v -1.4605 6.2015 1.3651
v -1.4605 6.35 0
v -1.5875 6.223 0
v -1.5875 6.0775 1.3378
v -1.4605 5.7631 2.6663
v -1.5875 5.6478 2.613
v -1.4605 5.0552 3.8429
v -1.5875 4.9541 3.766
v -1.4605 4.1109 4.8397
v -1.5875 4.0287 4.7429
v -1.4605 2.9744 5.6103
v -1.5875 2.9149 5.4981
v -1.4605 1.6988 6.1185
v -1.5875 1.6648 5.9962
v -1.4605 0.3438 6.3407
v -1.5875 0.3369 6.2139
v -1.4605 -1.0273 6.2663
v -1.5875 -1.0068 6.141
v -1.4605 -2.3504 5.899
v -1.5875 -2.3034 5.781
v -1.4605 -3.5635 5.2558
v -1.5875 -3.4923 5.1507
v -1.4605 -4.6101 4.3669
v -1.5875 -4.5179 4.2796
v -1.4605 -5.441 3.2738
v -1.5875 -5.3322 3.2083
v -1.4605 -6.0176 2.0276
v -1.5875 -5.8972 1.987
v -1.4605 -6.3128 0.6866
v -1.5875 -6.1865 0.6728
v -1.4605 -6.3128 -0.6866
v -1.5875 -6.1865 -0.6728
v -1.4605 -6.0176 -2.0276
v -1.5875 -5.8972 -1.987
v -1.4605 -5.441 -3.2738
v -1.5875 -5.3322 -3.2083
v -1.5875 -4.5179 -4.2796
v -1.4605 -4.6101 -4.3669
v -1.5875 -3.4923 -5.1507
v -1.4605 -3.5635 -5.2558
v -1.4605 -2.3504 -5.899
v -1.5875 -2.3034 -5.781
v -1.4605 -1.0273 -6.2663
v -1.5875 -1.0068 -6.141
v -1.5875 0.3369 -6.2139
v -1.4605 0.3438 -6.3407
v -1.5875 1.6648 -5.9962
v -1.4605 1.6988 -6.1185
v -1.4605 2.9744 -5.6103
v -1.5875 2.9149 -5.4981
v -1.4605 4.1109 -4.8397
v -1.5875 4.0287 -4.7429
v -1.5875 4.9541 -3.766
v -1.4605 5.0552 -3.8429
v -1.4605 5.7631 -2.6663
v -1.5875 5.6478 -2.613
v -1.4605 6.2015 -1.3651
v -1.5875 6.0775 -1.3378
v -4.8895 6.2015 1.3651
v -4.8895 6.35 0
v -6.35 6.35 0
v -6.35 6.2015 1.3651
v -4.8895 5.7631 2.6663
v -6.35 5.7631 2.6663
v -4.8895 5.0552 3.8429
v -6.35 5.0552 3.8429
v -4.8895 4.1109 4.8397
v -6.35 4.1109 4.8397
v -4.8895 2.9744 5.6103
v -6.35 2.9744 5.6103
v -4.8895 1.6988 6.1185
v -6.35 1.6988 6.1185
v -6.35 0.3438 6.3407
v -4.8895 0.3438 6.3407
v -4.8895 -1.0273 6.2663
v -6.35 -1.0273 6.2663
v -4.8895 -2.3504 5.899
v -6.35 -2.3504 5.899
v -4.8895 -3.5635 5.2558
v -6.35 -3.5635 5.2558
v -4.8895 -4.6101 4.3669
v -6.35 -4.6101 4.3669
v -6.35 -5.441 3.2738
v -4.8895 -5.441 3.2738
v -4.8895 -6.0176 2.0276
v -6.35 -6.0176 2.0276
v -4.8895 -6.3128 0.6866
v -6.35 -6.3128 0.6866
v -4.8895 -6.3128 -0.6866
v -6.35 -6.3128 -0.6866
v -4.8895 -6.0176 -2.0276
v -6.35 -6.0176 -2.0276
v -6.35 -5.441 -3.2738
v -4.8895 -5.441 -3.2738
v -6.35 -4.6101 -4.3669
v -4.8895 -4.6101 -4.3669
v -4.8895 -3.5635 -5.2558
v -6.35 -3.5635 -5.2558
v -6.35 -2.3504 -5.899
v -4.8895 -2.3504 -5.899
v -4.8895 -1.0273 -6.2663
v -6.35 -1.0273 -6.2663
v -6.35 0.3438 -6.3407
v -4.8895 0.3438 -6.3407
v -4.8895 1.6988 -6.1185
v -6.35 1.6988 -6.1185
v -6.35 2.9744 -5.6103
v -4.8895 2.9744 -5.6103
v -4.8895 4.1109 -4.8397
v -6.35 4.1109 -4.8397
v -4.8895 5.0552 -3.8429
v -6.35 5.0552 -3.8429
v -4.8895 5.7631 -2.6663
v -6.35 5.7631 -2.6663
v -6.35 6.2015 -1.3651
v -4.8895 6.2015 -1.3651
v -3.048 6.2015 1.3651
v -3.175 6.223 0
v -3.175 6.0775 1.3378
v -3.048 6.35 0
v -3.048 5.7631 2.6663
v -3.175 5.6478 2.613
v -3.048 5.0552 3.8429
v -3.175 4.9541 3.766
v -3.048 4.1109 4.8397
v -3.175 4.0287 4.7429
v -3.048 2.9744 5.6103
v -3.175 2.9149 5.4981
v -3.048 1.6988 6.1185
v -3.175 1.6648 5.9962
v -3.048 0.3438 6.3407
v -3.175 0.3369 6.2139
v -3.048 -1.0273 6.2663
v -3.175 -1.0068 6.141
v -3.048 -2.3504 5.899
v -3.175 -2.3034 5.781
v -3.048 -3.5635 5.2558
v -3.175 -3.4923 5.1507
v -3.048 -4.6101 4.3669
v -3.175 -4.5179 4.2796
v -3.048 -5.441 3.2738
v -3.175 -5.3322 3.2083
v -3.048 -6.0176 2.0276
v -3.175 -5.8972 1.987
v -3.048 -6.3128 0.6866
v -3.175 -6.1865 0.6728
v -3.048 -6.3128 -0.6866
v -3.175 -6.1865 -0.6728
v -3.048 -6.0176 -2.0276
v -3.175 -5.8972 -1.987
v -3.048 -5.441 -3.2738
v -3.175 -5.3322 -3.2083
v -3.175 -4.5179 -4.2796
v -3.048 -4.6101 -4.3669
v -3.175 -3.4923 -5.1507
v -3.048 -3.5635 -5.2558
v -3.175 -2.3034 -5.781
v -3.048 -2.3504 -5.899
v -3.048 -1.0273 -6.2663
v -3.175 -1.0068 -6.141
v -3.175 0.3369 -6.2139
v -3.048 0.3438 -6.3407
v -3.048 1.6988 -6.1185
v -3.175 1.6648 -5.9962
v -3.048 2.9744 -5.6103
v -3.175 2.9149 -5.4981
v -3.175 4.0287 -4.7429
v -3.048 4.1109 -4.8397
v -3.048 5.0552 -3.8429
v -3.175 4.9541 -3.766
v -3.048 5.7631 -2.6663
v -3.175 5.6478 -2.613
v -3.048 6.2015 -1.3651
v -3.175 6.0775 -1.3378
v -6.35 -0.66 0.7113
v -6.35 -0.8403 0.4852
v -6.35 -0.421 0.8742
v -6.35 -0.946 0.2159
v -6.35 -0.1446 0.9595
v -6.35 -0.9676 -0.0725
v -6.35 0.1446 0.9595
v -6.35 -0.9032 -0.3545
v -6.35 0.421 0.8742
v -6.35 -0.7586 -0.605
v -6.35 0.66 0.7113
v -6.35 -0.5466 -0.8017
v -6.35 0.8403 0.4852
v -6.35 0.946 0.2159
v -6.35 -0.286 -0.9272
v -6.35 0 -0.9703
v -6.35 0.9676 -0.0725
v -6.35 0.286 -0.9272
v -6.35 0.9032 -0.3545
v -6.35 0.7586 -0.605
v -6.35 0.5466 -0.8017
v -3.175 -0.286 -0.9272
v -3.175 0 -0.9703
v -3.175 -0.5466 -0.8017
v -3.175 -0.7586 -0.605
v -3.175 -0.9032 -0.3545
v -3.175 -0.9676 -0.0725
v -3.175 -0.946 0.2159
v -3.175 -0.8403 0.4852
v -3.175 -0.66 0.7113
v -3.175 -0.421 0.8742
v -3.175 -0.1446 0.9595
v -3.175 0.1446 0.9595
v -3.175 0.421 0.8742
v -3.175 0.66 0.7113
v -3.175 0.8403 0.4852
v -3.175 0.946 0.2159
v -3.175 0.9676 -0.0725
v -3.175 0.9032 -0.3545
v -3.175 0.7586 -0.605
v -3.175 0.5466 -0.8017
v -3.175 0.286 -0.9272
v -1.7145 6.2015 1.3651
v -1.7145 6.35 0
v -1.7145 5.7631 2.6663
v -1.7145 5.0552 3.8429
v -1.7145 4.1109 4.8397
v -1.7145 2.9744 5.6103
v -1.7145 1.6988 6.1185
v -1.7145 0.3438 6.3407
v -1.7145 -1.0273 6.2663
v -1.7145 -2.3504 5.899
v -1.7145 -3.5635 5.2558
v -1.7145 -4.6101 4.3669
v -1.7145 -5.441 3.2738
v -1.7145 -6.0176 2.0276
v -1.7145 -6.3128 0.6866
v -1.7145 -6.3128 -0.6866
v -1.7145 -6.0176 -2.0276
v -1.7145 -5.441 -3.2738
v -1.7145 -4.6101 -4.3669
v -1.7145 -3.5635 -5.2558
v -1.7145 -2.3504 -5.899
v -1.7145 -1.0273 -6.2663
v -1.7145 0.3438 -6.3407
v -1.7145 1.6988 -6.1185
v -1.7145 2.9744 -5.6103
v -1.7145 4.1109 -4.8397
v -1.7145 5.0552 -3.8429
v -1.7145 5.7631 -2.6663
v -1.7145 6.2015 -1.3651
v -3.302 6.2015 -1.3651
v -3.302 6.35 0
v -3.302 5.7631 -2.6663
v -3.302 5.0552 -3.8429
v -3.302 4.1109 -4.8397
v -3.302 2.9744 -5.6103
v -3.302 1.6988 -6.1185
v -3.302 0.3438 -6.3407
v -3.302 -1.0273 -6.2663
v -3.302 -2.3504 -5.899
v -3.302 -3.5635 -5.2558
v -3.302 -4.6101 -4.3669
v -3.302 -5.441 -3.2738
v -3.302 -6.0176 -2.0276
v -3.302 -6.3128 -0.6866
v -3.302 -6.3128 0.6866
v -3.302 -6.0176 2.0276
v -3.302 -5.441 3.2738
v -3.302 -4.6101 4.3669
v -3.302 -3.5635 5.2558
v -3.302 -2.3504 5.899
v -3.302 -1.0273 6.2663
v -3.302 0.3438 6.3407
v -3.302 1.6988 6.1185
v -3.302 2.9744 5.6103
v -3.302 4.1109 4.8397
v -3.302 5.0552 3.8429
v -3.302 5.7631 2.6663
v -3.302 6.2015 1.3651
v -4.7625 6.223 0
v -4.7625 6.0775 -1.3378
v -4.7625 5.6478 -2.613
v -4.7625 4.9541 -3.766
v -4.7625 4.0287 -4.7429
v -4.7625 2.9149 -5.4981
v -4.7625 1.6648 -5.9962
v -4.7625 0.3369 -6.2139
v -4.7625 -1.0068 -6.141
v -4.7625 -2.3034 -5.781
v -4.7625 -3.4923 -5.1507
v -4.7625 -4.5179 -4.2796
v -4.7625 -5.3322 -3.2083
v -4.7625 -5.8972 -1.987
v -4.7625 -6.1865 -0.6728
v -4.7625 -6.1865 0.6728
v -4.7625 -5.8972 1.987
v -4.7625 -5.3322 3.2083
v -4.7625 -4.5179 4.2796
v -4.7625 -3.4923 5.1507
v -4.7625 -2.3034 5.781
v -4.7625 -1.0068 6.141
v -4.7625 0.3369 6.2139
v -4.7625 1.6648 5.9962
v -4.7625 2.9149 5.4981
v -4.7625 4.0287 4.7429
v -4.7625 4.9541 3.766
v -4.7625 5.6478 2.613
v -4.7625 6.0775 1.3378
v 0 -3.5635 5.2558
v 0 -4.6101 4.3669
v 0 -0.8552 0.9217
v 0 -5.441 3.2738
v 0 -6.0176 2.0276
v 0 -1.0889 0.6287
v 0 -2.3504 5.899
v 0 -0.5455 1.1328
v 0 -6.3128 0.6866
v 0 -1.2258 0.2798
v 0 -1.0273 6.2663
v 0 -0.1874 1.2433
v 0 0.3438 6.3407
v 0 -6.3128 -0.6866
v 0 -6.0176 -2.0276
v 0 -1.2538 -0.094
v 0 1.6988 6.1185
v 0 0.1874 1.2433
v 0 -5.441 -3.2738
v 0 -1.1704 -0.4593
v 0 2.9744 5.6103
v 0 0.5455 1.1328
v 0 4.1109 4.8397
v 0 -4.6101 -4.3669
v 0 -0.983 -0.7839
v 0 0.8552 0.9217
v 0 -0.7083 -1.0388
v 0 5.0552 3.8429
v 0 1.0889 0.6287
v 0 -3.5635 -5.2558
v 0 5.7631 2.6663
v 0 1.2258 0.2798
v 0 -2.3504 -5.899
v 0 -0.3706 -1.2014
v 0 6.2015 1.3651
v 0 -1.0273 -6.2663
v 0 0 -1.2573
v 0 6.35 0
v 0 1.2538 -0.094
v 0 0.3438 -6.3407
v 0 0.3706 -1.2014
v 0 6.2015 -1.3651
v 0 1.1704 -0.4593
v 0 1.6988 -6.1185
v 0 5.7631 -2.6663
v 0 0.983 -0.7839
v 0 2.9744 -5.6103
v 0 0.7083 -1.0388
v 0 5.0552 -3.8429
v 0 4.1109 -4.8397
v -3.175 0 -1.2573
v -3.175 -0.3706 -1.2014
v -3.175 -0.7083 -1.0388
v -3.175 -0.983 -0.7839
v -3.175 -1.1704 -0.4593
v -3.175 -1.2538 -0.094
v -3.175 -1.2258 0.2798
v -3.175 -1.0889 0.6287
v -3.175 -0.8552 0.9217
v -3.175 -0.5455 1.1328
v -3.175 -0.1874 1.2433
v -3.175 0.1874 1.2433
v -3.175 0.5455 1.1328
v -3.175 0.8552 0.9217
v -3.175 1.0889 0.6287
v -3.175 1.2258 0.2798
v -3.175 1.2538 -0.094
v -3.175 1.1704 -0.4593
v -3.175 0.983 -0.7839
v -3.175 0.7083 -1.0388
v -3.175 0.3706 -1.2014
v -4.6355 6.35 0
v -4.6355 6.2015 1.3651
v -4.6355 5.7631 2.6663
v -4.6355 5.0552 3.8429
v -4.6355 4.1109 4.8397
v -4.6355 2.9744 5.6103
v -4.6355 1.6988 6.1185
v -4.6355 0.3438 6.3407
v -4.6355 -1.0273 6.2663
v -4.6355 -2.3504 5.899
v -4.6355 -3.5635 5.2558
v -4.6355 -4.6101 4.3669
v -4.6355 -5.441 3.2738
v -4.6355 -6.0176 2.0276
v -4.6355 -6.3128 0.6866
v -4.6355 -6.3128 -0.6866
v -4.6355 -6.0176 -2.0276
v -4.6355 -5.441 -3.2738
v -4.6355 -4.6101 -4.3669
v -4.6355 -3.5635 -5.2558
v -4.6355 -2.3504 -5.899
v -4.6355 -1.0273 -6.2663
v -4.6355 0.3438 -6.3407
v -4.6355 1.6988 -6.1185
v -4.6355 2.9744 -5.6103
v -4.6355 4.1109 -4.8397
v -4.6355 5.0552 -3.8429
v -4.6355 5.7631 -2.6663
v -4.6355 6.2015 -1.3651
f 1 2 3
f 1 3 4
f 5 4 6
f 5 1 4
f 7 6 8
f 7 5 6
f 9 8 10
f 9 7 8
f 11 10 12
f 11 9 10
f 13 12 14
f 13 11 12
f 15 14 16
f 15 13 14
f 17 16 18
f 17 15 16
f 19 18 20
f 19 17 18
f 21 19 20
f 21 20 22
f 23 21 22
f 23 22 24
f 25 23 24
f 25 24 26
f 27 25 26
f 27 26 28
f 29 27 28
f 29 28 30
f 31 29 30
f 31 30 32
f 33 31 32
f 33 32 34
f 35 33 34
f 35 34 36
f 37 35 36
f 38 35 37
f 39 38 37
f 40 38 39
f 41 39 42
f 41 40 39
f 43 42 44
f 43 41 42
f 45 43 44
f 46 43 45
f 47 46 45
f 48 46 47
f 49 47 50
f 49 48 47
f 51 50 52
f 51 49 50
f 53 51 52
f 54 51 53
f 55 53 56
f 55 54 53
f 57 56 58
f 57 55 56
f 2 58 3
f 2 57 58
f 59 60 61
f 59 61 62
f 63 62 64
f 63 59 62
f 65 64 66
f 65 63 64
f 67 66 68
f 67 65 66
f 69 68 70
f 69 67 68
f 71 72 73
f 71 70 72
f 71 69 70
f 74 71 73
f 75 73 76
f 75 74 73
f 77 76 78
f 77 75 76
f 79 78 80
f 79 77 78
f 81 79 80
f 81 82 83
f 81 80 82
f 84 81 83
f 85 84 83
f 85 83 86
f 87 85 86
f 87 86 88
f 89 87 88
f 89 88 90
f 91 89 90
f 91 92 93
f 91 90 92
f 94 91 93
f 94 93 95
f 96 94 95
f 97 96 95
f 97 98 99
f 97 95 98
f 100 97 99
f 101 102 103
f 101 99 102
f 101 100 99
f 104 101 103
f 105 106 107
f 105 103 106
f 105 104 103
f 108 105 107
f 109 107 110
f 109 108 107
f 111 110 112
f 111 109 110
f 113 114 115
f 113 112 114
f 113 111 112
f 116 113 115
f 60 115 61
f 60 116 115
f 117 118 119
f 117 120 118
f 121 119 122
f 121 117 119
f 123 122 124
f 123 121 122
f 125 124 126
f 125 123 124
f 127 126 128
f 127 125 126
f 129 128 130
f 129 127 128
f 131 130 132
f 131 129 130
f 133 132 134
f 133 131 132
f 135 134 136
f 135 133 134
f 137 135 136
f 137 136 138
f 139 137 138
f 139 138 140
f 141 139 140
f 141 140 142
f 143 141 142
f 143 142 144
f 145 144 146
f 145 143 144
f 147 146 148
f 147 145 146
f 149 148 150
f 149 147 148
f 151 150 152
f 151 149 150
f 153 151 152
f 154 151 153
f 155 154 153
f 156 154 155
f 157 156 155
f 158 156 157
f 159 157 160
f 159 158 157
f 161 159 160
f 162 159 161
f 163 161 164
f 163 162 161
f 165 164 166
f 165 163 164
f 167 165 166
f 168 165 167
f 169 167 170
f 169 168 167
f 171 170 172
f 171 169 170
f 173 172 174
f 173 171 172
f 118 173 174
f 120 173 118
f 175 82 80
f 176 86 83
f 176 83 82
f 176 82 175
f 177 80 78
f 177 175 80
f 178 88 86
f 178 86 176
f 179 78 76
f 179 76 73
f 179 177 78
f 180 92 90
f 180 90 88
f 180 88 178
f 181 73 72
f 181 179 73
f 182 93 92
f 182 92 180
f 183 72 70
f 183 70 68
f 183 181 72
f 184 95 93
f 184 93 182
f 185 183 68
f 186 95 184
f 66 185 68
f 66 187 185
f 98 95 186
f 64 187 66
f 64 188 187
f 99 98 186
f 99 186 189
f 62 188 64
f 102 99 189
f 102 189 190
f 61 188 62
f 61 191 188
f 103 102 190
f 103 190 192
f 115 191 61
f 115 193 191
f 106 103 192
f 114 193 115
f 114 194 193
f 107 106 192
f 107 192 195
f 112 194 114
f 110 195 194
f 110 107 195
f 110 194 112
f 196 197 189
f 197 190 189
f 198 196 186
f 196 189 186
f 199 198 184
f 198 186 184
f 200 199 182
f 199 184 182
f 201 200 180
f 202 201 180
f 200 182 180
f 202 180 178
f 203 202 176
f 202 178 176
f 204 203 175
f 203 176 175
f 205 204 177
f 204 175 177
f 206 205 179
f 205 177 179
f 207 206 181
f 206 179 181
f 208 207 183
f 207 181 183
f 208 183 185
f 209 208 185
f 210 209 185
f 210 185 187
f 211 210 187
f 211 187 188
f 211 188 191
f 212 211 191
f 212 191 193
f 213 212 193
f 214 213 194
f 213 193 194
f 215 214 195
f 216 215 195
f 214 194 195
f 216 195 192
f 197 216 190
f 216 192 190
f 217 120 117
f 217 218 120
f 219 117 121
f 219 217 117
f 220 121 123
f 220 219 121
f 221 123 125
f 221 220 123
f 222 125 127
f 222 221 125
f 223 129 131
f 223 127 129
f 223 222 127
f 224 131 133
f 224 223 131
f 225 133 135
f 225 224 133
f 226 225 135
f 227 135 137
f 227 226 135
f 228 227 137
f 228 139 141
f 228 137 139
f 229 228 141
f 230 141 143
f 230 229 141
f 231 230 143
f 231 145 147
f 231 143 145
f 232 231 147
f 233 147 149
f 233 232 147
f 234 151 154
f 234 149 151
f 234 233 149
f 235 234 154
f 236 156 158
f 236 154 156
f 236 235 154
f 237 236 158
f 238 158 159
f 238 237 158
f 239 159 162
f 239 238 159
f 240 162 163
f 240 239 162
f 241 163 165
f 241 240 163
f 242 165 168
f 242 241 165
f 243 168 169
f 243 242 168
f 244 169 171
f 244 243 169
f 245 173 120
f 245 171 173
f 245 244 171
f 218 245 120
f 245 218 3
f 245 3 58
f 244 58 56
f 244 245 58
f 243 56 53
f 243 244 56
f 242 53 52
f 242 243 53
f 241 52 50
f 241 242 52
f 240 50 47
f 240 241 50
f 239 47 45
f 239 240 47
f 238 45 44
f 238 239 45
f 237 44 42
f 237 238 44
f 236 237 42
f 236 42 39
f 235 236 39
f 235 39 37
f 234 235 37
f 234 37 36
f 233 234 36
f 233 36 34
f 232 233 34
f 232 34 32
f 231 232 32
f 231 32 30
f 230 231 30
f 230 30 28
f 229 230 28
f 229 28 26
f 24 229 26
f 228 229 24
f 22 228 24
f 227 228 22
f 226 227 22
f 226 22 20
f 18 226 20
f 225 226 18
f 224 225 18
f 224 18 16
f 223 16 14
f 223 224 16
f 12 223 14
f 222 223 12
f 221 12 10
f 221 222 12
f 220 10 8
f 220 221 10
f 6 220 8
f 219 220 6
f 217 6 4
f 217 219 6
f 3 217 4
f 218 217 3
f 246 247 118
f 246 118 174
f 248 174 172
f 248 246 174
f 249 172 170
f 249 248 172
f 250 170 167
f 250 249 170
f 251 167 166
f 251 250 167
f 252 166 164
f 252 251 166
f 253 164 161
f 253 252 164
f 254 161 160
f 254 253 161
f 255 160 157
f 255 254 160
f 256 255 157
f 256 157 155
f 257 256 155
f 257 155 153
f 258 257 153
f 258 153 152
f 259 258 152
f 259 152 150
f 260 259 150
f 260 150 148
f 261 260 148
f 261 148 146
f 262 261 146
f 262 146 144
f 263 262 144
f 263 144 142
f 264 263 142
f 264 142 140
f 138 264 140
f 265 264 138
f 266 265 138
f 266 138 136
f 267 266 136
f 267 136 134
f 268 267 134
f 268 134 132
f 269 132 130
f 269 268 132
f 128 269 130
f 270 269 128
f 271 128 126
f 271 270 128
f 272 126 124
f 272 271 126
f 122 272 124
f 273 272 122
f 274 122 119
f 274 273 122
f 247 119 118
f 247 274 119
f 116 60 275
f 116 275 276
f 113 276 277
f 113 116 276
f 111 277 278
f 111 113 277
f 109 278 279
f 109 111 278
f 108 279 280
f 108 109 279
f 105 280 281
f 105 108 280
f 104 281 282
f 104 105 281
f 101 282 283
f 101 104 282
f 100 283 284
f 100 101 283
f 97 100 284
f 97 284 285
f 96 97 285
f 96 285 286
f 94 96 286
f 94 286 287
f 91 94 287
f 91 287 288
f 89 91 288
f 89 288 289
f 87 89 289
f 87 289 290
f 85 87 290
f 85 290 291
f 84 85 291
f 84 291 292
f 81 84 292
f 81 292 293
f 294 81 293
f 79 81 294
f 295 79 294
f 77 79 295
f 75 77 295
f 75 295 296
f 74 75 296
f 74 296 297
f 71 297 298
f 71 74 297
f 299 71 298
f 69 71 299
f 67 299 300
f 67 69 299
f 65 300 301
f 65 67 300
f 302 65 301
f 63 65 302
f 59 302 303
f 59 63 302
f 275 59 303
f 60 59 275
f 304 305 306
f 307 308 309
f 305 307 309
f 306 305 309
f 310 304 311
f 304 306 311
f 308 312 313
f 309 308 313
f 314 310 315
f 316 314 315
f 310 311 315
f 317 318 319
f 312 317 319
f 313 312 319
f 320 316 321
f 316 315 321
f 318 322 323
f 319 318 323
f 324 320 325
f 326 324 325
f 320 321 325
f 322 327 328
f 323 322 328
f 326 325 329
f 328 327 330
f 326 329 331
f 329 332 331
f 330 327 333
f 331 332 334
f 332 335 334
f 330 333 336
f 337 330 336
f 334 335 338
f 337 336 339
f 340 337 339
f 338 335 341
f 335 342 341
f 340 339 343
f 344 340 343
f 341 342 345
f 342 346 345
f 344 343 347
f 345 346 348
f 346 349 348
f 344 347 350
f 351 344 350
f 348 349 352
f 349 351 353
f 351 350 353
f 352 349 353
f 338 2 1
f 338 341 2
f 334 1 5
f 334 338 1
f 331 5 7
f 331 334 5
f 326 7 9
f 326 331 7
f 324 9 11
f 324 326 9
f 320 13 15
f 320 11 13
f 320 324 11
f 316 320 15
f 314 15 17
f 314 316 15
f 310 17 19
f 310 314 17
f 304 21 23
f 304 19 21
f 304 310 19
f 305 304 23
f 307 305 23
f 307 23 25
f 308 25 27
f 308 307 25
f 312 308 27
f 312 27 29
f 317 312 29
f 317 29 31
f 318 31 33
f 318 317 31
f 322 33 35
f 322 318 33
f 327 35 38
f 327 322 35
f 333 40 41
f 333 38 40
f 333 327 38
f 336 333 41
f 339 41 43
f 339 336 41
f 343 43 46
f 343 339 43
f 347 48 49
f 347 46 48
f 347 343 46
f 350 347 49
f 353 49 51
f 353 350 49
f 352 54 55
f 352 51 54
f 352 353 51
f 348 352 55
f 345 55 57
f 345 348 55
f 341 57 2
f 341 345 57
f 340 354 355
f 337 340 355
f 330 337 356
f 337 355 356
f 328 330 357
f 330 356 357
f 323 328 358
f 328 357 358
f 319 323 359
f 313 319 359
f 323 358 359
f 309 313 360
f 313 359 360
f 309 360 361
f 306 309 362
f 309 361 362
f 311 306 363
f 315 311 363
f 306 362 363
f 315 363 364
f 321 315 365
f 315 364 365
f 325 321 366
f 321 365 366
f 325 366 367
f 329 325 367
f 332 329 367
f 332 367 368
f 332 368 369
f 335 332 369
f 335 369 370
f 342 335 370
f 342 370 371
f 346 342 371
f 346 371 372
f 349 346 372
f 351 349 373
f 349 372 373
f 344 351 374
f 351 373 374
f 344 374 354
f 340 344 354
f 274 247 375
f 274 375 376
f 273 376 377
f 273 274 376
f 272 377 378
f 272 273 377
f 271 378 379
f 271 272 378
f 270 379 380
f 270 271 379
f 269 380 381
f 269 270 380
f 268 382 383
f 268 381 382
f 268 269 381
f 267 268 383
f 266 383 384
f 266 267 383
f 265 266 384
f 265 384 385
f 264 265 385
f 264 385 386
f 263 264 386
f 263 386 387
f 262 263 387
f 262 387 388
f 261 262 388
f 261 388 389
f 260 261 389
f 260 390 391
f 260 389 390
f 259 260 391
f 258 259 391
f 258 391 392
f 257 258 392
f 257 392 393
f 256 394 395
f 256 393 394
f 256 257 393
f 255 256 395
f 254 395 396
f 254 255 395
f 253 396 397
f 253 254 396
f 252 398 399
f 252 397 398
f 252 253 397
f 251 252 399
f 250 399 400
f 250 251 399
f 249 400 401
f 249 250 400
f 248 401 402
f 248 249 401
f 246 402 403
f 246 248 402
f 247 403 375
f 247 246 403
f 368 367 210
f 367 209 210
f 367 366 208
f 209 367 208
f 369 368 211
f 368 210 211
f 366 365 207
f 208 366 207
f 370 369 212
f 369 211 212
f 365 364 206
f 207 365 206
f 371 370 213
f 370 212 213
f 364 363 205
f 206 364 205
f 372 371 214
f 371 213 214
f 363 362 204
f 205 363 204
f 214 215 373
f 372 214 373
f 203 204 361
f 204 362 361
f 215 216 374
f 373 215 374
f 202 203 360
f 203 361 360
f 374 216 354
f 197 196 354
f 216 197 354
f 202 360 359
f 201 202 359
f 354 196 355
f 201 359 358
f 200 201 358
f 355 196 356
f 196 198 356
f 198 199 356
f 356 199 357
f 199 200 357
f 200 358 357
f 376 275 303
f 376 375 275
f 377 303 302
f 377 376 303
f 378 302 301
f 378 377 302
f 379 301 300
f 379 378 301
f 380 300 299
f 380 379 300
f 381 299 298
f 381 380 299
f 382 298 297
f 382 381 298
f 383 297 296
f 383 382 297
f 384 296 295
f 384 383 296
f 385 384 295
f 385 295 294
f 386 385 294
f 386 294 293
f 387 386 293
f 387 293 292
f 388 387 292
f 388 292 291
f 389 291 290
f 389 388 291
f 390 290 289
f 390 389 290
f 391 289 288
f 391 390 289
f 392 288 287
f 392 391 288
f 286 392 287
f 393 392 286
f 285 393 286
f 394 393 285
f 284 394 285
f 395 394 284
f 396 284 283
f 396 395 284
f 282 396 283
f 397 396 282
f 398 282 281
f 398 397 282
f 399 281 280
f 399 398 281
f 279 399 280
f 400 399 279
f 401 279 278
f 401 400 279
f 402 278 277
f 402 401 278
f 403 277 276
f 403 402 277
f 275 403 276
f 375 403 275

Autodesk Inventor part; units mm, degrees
ref_plane "YZ Plane" through (0, 0, 0) normal (1, 0, 0) x (0, 1, 0)
ref_plane "XZ Plane" through (0, 0, 0) normal (0, 1, 0) x (-1, 0, 0)
ref_plane "XY Plane" through (0, 0, 0) normal (0, 0, 1) x (1, 0, 0)
sketch "Boceto1" plane through (0, 0, 0) normal (0, 0, 1) x (1, 0, 0)
  line L0 (0, 0) -> (-6.35, 0)
  line L1 (-6.35, 0) -> (-6.35, 6.35)
  line L2 (0, 6.35) -> (0, 0)
  line L3 (-4.7625, 6.223) -> (-4.6355, 6.35)
  line L4 (-4.7625, 6.223) -> (-4.5829, 6.223) construction
  line L5 (-4.7625, 6.223) -> (-4.8895, 6.35)
  line L6 (-4.7625, 6.223) -> (-4.5829, 6.223) construction
  line L7 (-3.175, 6.223) -> (-3.048, 6.35)
  line L8 (-3.175, 6.223) -> (-2.9954, 6.223) construction
  line L9 (-3.175, 6.223) -> (-3.302, 6.35)
  line L10 (-3.175, 6.223) -> (-2.9954, 6.223) construction
  line L11 (-1.5875, 6.223) -> (-1.4605, 6.35)
  line L12 (-1.5875, 6.223) -> (-1.4079, 6.223) construction
  line L13 (-1.5875, 6.223) -> (-1.7145, 6.35)
  line L14 (-1.5875, 6.223) -> (-1.4079, 6.223) construction
  line L15 (-6.35, 6.35) -> (-4.8895, 6.35)
  line L16 (-4.6355, 6.35) -> (-3.302, 6.35)
  line L17 (-3.048, 6.35) -> (-1.7145, 6.35)
  line L18 (-1.4605, 6.35) -> (0, 6.35)
  dimension "d0" = 6.35
  dimension "d1" = 6.35
  dimension "d3" = 1.5875
  dimension "d6" = 1.5875
  dimension "d7" = 1.5875
  dimension "d20" = 0.127
revolve "Revolución1" add sketch "Boceto1" angle 360 about axis through (0, 0, 0) along (-1, 0, 0)
sketch "Boceto2" plane through (0, 0, 0) normal (1, 0, 0) x (0, 0, -1)
  point P0 (0, 0)
  point P1 (0, 0)
hole "Agujero1" at (0, 0, 0) direction (-1, 0, 0) diameter 1.9406 end through all counterbore diameter 2.5146 counterbore depth 3.175 thread size "3-48 UNC" class "2B" standard "ANSI Unified Screw Threads"
equation "\"d7\" = d6"
properties part number "Piston" material "Latón, amarillo claro"
